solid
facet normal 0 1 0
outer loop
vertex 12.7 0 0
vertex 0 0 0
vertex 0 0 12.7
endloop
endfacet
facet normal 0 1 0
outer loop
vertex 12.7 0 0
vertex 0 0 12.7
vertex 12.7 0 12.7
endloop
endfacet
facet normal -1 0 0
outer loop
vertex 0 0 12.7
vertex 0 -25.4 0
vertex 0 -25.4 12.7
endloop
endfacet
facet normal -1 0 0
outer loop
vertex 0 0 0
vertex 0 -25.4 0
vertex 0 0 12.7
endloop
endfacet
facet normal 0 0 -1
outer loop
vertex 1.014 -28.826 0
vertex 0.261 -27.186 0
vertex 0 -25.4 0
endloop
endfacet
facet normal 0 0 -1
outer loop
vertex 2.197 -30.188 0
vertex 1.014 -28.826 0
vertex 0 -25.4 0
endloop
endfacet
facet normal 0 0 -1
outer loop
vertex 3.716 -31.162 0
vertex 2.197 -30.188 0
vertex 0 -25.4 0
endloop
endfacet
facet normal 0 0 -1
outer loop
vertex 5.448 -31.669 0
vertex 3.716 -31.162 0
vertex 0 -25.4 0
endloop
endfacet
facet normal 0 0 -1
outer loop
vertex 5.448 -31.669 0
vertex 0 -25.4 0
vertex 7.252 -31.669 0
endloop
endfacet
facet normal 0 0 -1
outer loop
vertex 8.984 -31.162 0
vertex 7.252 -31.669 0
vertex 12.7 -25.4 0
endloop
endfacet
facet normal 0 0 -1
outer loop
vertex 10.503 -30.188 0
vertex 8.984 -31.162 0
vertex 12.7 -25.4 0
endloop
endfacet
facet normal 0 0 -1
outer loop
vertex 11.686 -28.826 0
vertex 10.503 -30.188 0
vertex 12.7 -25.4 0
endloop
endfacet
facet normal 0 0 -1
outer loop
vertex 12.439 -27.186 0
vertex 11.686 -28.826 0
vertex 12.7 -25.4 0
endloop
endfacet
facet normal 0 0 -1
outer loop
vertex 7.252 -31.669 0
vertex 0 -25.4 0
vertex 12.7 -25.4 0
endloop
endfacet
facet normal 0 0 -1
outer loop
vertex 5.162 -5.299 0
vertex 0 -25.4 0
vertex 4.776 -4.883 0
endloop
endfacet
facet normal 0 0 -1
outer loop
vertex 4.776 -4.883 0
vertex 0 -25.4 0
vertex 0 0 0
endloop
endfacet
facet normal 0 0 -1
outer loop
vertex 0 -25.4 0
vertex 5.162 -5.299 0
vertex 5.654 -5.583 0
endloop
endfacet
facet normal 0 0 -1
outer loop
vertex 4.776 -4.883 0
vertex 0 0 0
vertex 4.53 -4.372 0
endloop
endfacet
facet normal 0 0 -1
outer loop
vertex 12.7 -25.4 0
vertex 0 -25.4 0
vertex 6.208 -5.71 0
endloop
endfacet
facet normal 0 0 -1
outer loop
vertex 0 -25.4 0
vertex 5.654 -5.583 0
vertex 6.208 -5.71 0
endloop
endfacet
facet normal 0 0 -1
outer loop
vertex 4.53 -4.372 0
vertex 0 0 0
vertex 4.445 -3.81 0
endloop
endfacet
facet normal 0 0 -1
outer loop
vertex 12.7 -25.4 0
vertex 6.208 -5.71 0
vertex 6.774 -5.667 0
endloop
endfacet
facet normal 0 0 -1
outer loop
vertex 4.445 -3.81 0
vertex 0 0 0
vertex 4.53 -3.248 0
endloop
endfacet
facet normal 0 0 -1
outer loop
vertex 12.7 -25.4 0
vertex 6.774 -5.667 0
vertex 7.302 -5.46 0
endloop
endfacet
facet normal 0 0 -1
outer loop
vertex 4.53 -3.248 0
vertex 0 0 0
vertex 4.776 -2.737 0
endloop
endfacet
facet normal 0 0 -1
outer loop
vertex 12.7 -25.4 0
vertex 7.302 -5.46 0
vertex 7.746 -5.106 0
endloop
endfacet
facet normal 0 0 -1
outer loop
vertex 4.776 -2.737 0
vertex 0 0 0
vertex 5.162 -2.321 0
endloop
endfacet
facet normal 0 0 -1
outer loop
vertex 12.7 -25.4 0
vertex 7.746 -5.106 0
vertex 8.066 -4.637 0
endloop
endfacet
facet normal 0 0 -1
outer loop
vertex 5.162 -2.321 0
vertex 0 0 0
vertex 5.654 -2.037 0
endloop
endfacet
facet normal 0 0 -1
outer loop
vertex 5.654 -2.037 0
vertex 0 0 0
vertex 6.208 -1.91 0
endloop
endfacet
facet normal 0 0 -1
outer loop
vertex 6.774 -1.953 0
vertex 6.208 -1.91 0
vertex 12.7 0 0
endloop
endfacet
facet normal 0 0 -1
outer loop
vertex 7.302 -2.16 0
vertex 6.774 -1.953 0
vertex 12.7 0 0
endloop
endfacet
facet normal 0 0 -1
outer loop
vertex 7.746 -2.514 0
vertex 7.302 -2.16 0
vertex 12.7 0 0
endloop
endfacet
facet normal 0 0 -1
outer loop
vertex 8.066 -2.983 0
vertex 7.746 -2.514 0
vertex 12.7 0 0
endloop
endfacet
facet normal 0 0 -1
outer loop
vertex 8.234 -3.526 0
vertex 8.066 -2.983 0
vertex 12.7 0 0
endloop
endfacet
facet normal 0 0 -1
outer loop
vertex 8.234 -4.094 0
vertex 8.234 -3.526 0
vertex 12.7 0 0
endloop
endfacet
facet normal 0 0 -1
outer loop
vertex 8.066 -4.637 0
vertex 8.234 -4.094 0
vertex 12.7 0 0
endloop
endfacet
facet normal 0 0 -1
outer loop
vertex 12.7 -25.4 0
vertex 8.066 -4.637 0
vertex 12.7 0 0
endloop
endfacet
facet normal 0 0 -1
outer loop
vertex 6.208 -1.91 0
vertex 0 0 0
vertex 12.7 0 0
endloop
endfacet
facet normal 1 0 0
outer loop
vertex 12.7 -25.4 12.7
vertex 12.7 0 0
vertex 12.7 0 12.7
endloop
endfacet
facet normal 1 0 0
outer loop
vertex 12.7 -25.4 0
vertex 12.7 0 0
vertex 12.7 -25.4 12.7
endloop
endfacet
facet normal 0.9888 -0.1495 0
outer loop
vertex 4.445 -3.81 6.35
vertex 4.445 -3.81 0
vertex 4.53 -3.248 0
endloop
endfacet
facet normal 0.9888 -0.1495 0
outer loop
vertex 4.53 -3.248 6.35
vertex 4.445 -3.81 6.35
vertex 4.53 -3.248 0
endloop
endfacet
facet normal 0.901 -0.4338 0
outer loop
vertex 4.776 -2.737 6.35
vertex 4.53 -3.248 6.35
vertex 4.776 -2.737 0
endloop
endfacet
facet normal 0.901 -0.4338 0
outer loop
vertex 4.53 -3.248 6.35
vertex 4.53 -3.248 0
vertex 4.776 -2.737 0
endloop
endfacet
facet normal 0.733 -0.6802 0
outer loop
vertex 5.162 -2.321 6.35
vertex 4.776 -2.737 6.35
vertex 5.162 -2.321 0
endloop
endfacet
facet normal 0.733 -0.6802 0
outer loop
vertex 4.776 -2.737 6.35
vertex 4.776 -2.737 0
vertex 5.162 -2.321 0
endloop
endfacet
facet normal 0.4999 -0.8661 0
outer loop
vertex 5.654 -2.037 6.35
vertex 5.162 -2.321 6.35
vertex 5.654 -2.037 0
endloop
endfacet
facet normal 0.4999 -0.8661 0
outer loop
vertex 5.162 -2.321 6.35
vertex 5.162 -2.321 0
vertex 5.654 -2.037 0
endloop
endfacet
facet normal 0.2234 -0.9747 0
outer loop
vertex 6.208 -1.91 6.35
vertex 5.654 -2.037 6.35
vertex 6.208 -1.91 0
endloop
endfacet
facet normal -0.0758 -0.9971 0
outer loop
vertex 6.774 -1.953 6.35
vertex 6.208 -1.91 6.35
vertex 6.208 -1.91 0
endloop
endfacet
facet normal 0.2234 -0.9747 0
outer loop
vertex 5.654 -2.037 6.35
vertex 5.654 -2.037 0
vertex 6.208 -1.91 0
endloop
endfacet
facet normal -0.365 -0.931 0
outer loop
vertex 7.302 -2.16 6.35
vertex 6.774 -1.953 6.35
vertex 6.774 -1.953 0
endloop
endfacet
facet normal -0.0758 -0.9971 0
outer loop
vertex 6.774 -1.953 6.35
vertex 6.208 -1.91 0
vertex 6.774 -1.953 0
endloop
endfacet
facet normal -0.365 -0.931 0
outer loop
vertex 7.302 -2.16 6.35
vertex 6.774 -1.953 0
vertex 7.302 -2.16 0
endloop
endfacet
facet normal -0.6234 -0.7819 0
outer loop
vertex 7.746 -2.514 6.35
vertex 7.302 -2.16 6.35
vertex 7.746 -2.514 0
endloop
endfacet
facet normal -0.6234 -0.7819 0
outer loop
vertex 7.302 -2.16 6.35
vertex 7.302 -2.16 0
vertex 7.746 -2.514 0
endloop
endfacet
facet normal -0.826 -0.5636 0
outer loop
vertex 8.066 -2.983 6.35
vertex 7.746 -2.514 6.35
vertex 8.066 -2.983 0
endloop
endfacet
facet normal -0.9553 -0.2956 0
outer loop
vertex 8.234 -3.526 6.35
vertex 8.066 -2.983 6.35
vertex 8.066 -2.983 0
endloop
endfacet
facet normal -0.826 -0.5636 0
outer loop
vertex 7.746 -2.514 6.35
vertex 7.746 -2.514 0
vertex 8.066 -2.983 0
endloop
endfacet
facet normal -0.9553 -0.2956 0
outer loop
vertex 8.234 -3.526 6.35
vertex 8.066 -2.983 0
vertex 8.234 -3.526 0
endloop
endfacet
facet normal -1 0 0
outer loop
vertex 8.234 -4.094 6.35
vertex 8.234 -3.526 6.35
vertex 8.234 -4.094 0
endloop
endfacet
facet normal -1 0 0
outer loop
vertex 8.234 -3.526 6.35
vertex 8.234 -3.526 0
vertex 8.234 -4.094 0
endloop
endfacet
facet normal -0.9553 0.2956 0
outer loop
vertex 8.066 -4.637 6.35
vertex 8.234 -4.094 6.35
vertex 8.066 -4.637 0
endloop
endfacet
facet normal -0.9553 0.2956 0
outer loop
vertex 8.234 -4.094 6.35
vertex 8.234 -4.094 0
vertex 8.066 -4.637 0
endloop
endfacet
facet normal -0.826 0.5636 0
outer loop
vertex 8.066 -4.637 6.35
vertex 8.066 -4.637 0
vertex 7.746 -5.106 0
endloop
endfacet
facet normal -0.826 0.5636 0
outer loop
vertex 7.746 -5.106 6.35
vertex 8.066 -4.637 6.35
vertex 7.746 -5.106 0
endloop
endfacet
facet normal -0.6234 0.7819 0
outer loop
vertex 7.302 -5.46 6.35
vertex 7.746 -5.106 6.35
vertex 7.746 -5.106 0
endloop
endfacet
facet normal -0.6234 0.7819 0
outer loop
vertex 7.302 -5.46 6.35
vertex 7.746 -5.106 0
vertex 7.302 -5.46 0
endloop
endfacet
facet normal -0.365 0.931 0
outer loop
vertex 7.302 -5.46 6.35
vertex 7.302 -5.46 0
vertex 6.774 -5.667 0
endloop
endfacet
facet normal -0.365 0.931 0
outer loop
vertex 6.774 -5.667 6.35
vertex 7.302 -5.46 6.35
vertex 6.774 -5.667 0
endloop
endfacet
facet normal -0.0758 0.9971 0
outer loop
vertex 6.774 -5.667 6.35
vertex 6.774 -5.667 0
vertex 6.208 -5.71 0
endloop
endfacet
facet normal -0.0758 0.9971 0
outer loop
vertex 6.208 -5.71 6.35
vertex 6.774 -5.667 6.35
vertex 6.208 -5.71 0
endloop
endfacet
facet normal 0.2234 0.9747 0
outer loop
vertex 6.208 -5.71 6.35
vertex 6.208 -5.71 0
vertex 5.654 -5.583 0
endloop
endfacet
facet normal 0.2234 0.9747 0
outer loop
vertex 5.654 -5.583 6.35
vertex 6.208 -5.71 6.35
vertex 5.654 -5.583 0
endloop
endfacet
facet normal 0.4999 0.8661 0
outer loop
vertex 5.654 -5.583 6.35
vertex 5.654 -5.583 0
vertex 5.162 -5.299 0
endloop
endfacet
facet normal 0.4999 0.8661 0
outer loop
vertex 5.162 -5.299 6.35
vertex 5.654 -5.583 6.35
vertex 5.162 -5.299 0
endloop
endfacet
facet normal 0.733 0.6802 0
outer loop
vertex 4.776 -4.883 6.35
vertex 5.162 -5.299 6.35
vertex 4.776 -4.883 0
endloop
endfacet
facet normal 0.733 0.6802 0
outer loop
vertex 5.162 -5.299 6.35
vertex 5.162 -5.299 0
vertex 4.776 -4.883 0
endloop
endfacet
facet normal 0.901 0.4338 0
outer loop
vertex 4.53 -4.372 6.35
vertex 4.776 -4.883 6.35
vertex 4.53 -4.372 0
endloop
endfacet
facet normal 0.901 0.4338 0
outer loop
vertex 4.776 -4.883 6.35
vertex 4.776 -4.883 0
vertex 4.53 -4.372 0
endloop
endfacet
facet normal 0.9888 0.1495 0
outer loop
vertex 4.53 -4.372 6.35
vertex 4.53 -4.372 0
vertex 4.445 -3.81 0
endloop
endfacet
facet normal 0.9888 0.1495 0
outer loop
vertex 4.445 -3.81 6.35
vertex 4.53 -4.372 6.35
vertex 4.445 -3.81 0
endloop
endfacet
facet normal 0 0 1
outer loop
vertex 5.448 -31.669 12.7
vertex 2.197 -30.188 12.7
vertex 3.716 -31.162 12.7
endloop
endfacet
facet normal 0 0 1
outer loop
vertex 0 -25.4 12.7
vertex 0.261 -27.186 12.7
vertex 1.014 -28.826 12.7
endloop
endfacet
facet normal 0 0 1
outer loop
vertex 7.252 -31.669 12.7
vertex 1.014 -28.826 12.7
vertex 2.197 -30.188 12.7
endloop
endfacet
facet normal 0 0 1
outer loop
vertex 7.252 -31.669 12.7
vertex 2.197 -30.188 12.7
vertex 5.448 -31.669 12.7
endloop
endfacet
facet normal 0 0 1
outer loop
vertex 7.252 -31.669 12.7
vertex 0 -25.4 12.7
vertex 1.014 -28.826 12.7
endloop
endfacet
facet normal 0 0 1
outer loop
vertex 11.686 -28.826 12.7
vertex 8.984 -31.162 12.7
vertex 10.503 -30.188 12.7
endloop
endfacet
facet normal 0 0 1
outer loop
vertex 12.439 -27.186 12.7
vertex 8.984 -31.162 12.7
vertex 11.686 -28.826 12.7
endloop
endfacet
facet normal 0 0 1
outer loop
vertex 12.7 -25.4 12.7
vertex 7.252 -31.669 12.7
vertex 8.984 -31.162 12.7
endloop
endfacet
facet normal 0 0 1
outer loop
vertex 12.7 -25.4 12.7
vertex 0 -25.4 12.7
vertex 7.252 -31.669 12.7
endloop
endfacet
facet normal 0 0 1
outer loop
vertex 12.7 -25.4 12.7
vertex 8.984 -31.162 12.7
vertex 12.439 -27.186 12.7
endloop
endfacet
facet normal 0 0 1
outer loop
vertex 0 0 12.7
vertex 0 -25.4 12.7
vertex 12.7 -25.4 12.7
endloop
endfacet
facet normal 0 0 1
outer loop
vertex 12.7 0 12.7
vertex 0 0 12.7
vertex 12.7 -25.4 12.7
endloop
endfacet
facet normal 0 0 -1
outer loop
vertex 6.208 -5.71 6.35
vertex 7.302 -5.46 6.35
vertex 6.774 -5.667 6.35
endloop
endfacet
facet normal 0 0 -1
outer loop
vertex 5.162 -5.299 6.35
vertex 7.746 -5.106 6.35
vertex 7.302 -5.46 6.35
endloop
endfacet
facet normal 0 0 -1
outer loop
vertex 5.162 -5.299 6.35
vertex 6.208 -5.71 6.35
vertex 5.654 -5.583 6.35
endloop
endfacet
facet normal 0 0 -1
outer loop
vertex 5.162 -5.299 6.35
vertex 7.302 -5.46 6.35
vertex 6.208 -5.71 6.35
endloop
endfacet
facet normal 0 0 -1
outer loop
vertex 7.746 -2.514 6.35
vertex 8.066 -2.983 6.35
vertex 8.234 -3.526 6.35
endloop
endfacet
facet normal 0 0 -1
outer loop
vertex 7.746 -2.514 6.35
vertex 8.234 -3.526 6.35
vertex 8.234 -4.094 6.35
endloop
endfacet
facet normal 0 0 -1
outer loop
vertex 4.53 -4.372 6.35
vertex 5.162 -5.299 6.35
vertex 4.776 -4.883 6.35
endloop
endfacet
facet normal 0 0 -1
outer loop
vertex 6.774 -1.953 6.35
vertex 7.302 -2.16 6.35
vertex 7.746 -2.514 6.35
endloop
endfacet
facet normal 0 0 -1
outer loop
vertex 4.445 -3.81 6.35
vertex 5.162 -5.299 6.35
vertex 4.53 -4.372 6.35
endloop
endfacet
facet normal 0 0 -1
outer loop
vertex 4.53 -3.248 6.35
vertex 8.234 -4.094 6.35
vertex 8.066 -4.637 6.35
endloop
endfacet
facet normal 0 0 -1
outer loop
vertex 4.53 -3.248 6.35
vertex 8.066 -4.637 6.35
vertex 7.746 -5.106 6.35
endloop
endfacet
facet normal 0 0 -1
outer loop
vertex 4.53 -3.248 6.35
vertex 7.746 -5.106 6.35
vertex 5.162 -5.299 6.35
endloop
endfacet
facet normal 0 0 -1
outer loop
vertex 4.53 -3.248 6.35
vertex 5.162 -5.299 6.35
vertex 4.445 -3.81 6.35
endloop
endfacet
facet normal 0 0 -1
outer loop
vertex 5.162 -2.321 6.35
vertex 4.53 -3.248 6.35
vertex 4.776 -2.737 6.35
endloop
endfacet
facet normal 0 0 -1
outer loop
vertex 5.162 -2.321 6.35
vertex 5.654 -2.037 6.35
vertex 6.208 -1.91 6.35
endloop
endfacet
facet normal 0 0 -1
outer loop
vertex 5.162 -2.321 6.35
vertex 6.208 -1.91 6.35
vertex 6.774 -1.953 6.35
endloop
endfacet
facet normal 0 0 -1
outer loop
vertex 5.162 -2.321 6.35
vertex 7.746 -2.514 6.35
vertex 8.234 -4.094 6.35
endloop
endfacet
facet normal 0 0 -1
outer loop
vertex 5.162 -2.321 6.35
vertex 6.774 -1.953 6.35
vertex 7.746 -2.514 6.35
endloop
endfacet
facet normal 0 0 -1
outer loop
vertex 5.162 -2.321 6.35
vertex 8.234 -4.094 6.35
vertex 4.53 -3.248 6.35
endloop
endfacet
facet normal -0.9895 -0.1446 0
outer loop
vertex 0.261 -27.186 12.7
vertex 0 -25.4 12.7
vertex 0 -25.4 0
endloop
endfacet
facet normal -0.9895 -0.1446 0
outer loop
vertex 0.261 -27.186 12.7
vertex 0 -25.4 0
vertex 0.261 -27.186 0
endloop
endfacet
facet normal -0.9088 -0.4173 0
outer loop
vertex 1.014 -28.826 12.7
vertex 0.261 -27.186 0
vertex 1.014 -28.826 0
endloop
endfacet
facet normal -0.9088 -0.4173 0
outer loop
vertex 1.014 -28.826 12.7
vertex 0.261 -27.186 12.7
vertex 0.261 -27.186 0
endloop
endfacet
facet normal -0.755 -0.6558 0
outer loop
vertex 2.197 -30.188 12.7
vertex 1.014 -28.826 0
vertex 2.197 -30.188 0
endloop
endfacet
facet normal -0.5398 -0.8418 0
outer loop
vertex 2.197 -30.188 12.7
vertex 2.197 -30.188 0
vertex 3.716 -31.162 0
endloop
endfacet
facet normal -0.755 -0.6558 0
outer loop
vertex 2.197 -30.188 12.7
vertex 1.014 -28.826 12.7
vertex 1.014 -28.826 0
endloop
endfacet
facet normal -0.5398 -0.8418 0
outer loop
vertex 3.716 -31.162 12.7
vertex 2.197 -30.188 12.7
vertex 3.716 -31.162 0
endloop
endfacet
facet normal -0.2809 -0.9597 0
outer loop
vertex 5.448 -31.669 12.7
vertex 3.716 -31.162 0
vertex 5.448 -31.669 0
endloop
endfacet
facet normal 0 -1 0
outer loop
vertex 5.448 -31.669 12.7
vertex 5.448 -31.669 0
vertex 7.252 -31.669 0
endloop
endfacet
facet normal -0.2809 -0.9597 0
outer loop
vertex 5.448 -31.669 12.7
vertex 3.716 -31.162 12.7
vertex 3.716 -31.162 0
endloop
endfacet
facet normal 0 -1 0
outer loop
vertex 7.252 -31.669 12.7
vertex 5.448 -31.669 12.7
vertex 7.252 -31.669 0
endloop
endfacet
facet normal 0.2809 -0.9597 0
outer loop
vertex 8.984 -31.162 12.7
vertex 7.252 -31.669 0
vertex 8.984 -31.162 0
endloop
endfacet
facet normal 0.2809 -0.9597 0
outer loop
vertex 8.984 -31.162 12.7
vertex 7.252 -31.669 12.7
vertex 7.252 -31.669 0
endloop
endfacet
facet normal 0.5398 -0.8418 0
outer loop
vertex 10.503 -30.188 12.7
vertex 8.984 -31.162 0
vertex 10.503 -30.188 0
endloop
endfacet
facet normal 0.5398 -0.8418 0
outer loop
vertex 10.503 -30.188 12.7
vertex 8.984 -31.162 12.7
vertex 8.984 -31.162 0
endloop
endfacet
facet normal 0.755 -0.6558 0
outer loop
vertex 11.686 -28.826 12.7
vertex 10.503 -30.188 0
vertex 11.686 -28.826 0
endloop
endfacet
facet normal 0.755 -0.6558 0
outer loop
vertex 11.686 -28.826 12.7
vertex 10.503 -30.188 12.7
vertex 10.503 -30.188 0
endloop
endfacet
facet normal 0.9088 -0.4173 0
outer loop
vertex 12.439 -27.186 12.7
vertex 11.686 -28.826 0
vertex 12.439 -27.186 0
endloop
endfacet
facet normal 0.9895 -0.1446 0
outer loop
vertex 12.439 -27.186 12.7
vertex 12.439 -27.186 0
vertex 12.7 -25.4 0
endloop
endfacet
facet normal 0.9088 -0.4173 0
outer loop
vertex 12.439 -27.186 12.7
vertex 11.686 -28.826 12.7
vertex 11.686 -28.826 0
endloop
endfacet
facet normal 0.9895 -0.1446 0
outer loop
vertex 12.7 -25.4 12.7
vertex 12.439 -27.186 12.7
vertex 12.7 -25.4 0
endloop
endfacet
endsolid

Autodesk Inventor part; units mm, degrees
ref_plane "YZ Plane" through (0, 0, 0) normal (1, 0, 0) x (0, 1, 0)
ref_plane "XZ Plane" through (0, 0, 0) normal (0, 1, 0) x (-1, 0, 0)
ref_plane "XY Plane" through (0, 0, 0) normal (0, 0, 1) x (1, 0, 0)
sketch "Sketch1" plane through (0, 0, 0) normal (0, 0, 1) x (1, 0, 0)
  line L0 (0, 0) -> (12.7, 0)
  line L1 (12.7, 0) -> (12.7, -25.4)
  line L2 (12.7, -25.4) -> (0, -25.4)
  line L3 (0, -25.4) -> (0, 0)
  dimension "d0" = 25.4
  dimension "d1" = 12.7
extrude "Extrusion1" add sketch "Sketch1" along normal blind 12.7
sketch "Sketch2" plane through (0, 0, 12.7) normal (0, 0, 1) x (1, 0, 0)
  line L0 (0, -25.4) -> (12.7, -25.4) projected
  arc A0 (0, -25.4) -> (12.7, -25.4) centre (6.35, -25.3838) ccw
  point P0 (0, 0)
extrude "Extrusion2" add sketch "Sketch2" against normal blind 12.7
sketch "Sketch3" plane through (0, 0, 0) normal (0, 0, -1) x (-1, 0, 0)
  line L0 (-12.7, 0) -> (0, 0) construction
  line L1 (-6.35, 0) -> (-6.35, -3.81) construction
  circle A0 centre (-6.35, -3.81) radius 1.905
  dimension "d7" = 3.81
  dimension "d8" = 3.81
extrude "Extrusion3" cut sketch "Sketch3" against normal blind 6.35
properties part number "Finger"
